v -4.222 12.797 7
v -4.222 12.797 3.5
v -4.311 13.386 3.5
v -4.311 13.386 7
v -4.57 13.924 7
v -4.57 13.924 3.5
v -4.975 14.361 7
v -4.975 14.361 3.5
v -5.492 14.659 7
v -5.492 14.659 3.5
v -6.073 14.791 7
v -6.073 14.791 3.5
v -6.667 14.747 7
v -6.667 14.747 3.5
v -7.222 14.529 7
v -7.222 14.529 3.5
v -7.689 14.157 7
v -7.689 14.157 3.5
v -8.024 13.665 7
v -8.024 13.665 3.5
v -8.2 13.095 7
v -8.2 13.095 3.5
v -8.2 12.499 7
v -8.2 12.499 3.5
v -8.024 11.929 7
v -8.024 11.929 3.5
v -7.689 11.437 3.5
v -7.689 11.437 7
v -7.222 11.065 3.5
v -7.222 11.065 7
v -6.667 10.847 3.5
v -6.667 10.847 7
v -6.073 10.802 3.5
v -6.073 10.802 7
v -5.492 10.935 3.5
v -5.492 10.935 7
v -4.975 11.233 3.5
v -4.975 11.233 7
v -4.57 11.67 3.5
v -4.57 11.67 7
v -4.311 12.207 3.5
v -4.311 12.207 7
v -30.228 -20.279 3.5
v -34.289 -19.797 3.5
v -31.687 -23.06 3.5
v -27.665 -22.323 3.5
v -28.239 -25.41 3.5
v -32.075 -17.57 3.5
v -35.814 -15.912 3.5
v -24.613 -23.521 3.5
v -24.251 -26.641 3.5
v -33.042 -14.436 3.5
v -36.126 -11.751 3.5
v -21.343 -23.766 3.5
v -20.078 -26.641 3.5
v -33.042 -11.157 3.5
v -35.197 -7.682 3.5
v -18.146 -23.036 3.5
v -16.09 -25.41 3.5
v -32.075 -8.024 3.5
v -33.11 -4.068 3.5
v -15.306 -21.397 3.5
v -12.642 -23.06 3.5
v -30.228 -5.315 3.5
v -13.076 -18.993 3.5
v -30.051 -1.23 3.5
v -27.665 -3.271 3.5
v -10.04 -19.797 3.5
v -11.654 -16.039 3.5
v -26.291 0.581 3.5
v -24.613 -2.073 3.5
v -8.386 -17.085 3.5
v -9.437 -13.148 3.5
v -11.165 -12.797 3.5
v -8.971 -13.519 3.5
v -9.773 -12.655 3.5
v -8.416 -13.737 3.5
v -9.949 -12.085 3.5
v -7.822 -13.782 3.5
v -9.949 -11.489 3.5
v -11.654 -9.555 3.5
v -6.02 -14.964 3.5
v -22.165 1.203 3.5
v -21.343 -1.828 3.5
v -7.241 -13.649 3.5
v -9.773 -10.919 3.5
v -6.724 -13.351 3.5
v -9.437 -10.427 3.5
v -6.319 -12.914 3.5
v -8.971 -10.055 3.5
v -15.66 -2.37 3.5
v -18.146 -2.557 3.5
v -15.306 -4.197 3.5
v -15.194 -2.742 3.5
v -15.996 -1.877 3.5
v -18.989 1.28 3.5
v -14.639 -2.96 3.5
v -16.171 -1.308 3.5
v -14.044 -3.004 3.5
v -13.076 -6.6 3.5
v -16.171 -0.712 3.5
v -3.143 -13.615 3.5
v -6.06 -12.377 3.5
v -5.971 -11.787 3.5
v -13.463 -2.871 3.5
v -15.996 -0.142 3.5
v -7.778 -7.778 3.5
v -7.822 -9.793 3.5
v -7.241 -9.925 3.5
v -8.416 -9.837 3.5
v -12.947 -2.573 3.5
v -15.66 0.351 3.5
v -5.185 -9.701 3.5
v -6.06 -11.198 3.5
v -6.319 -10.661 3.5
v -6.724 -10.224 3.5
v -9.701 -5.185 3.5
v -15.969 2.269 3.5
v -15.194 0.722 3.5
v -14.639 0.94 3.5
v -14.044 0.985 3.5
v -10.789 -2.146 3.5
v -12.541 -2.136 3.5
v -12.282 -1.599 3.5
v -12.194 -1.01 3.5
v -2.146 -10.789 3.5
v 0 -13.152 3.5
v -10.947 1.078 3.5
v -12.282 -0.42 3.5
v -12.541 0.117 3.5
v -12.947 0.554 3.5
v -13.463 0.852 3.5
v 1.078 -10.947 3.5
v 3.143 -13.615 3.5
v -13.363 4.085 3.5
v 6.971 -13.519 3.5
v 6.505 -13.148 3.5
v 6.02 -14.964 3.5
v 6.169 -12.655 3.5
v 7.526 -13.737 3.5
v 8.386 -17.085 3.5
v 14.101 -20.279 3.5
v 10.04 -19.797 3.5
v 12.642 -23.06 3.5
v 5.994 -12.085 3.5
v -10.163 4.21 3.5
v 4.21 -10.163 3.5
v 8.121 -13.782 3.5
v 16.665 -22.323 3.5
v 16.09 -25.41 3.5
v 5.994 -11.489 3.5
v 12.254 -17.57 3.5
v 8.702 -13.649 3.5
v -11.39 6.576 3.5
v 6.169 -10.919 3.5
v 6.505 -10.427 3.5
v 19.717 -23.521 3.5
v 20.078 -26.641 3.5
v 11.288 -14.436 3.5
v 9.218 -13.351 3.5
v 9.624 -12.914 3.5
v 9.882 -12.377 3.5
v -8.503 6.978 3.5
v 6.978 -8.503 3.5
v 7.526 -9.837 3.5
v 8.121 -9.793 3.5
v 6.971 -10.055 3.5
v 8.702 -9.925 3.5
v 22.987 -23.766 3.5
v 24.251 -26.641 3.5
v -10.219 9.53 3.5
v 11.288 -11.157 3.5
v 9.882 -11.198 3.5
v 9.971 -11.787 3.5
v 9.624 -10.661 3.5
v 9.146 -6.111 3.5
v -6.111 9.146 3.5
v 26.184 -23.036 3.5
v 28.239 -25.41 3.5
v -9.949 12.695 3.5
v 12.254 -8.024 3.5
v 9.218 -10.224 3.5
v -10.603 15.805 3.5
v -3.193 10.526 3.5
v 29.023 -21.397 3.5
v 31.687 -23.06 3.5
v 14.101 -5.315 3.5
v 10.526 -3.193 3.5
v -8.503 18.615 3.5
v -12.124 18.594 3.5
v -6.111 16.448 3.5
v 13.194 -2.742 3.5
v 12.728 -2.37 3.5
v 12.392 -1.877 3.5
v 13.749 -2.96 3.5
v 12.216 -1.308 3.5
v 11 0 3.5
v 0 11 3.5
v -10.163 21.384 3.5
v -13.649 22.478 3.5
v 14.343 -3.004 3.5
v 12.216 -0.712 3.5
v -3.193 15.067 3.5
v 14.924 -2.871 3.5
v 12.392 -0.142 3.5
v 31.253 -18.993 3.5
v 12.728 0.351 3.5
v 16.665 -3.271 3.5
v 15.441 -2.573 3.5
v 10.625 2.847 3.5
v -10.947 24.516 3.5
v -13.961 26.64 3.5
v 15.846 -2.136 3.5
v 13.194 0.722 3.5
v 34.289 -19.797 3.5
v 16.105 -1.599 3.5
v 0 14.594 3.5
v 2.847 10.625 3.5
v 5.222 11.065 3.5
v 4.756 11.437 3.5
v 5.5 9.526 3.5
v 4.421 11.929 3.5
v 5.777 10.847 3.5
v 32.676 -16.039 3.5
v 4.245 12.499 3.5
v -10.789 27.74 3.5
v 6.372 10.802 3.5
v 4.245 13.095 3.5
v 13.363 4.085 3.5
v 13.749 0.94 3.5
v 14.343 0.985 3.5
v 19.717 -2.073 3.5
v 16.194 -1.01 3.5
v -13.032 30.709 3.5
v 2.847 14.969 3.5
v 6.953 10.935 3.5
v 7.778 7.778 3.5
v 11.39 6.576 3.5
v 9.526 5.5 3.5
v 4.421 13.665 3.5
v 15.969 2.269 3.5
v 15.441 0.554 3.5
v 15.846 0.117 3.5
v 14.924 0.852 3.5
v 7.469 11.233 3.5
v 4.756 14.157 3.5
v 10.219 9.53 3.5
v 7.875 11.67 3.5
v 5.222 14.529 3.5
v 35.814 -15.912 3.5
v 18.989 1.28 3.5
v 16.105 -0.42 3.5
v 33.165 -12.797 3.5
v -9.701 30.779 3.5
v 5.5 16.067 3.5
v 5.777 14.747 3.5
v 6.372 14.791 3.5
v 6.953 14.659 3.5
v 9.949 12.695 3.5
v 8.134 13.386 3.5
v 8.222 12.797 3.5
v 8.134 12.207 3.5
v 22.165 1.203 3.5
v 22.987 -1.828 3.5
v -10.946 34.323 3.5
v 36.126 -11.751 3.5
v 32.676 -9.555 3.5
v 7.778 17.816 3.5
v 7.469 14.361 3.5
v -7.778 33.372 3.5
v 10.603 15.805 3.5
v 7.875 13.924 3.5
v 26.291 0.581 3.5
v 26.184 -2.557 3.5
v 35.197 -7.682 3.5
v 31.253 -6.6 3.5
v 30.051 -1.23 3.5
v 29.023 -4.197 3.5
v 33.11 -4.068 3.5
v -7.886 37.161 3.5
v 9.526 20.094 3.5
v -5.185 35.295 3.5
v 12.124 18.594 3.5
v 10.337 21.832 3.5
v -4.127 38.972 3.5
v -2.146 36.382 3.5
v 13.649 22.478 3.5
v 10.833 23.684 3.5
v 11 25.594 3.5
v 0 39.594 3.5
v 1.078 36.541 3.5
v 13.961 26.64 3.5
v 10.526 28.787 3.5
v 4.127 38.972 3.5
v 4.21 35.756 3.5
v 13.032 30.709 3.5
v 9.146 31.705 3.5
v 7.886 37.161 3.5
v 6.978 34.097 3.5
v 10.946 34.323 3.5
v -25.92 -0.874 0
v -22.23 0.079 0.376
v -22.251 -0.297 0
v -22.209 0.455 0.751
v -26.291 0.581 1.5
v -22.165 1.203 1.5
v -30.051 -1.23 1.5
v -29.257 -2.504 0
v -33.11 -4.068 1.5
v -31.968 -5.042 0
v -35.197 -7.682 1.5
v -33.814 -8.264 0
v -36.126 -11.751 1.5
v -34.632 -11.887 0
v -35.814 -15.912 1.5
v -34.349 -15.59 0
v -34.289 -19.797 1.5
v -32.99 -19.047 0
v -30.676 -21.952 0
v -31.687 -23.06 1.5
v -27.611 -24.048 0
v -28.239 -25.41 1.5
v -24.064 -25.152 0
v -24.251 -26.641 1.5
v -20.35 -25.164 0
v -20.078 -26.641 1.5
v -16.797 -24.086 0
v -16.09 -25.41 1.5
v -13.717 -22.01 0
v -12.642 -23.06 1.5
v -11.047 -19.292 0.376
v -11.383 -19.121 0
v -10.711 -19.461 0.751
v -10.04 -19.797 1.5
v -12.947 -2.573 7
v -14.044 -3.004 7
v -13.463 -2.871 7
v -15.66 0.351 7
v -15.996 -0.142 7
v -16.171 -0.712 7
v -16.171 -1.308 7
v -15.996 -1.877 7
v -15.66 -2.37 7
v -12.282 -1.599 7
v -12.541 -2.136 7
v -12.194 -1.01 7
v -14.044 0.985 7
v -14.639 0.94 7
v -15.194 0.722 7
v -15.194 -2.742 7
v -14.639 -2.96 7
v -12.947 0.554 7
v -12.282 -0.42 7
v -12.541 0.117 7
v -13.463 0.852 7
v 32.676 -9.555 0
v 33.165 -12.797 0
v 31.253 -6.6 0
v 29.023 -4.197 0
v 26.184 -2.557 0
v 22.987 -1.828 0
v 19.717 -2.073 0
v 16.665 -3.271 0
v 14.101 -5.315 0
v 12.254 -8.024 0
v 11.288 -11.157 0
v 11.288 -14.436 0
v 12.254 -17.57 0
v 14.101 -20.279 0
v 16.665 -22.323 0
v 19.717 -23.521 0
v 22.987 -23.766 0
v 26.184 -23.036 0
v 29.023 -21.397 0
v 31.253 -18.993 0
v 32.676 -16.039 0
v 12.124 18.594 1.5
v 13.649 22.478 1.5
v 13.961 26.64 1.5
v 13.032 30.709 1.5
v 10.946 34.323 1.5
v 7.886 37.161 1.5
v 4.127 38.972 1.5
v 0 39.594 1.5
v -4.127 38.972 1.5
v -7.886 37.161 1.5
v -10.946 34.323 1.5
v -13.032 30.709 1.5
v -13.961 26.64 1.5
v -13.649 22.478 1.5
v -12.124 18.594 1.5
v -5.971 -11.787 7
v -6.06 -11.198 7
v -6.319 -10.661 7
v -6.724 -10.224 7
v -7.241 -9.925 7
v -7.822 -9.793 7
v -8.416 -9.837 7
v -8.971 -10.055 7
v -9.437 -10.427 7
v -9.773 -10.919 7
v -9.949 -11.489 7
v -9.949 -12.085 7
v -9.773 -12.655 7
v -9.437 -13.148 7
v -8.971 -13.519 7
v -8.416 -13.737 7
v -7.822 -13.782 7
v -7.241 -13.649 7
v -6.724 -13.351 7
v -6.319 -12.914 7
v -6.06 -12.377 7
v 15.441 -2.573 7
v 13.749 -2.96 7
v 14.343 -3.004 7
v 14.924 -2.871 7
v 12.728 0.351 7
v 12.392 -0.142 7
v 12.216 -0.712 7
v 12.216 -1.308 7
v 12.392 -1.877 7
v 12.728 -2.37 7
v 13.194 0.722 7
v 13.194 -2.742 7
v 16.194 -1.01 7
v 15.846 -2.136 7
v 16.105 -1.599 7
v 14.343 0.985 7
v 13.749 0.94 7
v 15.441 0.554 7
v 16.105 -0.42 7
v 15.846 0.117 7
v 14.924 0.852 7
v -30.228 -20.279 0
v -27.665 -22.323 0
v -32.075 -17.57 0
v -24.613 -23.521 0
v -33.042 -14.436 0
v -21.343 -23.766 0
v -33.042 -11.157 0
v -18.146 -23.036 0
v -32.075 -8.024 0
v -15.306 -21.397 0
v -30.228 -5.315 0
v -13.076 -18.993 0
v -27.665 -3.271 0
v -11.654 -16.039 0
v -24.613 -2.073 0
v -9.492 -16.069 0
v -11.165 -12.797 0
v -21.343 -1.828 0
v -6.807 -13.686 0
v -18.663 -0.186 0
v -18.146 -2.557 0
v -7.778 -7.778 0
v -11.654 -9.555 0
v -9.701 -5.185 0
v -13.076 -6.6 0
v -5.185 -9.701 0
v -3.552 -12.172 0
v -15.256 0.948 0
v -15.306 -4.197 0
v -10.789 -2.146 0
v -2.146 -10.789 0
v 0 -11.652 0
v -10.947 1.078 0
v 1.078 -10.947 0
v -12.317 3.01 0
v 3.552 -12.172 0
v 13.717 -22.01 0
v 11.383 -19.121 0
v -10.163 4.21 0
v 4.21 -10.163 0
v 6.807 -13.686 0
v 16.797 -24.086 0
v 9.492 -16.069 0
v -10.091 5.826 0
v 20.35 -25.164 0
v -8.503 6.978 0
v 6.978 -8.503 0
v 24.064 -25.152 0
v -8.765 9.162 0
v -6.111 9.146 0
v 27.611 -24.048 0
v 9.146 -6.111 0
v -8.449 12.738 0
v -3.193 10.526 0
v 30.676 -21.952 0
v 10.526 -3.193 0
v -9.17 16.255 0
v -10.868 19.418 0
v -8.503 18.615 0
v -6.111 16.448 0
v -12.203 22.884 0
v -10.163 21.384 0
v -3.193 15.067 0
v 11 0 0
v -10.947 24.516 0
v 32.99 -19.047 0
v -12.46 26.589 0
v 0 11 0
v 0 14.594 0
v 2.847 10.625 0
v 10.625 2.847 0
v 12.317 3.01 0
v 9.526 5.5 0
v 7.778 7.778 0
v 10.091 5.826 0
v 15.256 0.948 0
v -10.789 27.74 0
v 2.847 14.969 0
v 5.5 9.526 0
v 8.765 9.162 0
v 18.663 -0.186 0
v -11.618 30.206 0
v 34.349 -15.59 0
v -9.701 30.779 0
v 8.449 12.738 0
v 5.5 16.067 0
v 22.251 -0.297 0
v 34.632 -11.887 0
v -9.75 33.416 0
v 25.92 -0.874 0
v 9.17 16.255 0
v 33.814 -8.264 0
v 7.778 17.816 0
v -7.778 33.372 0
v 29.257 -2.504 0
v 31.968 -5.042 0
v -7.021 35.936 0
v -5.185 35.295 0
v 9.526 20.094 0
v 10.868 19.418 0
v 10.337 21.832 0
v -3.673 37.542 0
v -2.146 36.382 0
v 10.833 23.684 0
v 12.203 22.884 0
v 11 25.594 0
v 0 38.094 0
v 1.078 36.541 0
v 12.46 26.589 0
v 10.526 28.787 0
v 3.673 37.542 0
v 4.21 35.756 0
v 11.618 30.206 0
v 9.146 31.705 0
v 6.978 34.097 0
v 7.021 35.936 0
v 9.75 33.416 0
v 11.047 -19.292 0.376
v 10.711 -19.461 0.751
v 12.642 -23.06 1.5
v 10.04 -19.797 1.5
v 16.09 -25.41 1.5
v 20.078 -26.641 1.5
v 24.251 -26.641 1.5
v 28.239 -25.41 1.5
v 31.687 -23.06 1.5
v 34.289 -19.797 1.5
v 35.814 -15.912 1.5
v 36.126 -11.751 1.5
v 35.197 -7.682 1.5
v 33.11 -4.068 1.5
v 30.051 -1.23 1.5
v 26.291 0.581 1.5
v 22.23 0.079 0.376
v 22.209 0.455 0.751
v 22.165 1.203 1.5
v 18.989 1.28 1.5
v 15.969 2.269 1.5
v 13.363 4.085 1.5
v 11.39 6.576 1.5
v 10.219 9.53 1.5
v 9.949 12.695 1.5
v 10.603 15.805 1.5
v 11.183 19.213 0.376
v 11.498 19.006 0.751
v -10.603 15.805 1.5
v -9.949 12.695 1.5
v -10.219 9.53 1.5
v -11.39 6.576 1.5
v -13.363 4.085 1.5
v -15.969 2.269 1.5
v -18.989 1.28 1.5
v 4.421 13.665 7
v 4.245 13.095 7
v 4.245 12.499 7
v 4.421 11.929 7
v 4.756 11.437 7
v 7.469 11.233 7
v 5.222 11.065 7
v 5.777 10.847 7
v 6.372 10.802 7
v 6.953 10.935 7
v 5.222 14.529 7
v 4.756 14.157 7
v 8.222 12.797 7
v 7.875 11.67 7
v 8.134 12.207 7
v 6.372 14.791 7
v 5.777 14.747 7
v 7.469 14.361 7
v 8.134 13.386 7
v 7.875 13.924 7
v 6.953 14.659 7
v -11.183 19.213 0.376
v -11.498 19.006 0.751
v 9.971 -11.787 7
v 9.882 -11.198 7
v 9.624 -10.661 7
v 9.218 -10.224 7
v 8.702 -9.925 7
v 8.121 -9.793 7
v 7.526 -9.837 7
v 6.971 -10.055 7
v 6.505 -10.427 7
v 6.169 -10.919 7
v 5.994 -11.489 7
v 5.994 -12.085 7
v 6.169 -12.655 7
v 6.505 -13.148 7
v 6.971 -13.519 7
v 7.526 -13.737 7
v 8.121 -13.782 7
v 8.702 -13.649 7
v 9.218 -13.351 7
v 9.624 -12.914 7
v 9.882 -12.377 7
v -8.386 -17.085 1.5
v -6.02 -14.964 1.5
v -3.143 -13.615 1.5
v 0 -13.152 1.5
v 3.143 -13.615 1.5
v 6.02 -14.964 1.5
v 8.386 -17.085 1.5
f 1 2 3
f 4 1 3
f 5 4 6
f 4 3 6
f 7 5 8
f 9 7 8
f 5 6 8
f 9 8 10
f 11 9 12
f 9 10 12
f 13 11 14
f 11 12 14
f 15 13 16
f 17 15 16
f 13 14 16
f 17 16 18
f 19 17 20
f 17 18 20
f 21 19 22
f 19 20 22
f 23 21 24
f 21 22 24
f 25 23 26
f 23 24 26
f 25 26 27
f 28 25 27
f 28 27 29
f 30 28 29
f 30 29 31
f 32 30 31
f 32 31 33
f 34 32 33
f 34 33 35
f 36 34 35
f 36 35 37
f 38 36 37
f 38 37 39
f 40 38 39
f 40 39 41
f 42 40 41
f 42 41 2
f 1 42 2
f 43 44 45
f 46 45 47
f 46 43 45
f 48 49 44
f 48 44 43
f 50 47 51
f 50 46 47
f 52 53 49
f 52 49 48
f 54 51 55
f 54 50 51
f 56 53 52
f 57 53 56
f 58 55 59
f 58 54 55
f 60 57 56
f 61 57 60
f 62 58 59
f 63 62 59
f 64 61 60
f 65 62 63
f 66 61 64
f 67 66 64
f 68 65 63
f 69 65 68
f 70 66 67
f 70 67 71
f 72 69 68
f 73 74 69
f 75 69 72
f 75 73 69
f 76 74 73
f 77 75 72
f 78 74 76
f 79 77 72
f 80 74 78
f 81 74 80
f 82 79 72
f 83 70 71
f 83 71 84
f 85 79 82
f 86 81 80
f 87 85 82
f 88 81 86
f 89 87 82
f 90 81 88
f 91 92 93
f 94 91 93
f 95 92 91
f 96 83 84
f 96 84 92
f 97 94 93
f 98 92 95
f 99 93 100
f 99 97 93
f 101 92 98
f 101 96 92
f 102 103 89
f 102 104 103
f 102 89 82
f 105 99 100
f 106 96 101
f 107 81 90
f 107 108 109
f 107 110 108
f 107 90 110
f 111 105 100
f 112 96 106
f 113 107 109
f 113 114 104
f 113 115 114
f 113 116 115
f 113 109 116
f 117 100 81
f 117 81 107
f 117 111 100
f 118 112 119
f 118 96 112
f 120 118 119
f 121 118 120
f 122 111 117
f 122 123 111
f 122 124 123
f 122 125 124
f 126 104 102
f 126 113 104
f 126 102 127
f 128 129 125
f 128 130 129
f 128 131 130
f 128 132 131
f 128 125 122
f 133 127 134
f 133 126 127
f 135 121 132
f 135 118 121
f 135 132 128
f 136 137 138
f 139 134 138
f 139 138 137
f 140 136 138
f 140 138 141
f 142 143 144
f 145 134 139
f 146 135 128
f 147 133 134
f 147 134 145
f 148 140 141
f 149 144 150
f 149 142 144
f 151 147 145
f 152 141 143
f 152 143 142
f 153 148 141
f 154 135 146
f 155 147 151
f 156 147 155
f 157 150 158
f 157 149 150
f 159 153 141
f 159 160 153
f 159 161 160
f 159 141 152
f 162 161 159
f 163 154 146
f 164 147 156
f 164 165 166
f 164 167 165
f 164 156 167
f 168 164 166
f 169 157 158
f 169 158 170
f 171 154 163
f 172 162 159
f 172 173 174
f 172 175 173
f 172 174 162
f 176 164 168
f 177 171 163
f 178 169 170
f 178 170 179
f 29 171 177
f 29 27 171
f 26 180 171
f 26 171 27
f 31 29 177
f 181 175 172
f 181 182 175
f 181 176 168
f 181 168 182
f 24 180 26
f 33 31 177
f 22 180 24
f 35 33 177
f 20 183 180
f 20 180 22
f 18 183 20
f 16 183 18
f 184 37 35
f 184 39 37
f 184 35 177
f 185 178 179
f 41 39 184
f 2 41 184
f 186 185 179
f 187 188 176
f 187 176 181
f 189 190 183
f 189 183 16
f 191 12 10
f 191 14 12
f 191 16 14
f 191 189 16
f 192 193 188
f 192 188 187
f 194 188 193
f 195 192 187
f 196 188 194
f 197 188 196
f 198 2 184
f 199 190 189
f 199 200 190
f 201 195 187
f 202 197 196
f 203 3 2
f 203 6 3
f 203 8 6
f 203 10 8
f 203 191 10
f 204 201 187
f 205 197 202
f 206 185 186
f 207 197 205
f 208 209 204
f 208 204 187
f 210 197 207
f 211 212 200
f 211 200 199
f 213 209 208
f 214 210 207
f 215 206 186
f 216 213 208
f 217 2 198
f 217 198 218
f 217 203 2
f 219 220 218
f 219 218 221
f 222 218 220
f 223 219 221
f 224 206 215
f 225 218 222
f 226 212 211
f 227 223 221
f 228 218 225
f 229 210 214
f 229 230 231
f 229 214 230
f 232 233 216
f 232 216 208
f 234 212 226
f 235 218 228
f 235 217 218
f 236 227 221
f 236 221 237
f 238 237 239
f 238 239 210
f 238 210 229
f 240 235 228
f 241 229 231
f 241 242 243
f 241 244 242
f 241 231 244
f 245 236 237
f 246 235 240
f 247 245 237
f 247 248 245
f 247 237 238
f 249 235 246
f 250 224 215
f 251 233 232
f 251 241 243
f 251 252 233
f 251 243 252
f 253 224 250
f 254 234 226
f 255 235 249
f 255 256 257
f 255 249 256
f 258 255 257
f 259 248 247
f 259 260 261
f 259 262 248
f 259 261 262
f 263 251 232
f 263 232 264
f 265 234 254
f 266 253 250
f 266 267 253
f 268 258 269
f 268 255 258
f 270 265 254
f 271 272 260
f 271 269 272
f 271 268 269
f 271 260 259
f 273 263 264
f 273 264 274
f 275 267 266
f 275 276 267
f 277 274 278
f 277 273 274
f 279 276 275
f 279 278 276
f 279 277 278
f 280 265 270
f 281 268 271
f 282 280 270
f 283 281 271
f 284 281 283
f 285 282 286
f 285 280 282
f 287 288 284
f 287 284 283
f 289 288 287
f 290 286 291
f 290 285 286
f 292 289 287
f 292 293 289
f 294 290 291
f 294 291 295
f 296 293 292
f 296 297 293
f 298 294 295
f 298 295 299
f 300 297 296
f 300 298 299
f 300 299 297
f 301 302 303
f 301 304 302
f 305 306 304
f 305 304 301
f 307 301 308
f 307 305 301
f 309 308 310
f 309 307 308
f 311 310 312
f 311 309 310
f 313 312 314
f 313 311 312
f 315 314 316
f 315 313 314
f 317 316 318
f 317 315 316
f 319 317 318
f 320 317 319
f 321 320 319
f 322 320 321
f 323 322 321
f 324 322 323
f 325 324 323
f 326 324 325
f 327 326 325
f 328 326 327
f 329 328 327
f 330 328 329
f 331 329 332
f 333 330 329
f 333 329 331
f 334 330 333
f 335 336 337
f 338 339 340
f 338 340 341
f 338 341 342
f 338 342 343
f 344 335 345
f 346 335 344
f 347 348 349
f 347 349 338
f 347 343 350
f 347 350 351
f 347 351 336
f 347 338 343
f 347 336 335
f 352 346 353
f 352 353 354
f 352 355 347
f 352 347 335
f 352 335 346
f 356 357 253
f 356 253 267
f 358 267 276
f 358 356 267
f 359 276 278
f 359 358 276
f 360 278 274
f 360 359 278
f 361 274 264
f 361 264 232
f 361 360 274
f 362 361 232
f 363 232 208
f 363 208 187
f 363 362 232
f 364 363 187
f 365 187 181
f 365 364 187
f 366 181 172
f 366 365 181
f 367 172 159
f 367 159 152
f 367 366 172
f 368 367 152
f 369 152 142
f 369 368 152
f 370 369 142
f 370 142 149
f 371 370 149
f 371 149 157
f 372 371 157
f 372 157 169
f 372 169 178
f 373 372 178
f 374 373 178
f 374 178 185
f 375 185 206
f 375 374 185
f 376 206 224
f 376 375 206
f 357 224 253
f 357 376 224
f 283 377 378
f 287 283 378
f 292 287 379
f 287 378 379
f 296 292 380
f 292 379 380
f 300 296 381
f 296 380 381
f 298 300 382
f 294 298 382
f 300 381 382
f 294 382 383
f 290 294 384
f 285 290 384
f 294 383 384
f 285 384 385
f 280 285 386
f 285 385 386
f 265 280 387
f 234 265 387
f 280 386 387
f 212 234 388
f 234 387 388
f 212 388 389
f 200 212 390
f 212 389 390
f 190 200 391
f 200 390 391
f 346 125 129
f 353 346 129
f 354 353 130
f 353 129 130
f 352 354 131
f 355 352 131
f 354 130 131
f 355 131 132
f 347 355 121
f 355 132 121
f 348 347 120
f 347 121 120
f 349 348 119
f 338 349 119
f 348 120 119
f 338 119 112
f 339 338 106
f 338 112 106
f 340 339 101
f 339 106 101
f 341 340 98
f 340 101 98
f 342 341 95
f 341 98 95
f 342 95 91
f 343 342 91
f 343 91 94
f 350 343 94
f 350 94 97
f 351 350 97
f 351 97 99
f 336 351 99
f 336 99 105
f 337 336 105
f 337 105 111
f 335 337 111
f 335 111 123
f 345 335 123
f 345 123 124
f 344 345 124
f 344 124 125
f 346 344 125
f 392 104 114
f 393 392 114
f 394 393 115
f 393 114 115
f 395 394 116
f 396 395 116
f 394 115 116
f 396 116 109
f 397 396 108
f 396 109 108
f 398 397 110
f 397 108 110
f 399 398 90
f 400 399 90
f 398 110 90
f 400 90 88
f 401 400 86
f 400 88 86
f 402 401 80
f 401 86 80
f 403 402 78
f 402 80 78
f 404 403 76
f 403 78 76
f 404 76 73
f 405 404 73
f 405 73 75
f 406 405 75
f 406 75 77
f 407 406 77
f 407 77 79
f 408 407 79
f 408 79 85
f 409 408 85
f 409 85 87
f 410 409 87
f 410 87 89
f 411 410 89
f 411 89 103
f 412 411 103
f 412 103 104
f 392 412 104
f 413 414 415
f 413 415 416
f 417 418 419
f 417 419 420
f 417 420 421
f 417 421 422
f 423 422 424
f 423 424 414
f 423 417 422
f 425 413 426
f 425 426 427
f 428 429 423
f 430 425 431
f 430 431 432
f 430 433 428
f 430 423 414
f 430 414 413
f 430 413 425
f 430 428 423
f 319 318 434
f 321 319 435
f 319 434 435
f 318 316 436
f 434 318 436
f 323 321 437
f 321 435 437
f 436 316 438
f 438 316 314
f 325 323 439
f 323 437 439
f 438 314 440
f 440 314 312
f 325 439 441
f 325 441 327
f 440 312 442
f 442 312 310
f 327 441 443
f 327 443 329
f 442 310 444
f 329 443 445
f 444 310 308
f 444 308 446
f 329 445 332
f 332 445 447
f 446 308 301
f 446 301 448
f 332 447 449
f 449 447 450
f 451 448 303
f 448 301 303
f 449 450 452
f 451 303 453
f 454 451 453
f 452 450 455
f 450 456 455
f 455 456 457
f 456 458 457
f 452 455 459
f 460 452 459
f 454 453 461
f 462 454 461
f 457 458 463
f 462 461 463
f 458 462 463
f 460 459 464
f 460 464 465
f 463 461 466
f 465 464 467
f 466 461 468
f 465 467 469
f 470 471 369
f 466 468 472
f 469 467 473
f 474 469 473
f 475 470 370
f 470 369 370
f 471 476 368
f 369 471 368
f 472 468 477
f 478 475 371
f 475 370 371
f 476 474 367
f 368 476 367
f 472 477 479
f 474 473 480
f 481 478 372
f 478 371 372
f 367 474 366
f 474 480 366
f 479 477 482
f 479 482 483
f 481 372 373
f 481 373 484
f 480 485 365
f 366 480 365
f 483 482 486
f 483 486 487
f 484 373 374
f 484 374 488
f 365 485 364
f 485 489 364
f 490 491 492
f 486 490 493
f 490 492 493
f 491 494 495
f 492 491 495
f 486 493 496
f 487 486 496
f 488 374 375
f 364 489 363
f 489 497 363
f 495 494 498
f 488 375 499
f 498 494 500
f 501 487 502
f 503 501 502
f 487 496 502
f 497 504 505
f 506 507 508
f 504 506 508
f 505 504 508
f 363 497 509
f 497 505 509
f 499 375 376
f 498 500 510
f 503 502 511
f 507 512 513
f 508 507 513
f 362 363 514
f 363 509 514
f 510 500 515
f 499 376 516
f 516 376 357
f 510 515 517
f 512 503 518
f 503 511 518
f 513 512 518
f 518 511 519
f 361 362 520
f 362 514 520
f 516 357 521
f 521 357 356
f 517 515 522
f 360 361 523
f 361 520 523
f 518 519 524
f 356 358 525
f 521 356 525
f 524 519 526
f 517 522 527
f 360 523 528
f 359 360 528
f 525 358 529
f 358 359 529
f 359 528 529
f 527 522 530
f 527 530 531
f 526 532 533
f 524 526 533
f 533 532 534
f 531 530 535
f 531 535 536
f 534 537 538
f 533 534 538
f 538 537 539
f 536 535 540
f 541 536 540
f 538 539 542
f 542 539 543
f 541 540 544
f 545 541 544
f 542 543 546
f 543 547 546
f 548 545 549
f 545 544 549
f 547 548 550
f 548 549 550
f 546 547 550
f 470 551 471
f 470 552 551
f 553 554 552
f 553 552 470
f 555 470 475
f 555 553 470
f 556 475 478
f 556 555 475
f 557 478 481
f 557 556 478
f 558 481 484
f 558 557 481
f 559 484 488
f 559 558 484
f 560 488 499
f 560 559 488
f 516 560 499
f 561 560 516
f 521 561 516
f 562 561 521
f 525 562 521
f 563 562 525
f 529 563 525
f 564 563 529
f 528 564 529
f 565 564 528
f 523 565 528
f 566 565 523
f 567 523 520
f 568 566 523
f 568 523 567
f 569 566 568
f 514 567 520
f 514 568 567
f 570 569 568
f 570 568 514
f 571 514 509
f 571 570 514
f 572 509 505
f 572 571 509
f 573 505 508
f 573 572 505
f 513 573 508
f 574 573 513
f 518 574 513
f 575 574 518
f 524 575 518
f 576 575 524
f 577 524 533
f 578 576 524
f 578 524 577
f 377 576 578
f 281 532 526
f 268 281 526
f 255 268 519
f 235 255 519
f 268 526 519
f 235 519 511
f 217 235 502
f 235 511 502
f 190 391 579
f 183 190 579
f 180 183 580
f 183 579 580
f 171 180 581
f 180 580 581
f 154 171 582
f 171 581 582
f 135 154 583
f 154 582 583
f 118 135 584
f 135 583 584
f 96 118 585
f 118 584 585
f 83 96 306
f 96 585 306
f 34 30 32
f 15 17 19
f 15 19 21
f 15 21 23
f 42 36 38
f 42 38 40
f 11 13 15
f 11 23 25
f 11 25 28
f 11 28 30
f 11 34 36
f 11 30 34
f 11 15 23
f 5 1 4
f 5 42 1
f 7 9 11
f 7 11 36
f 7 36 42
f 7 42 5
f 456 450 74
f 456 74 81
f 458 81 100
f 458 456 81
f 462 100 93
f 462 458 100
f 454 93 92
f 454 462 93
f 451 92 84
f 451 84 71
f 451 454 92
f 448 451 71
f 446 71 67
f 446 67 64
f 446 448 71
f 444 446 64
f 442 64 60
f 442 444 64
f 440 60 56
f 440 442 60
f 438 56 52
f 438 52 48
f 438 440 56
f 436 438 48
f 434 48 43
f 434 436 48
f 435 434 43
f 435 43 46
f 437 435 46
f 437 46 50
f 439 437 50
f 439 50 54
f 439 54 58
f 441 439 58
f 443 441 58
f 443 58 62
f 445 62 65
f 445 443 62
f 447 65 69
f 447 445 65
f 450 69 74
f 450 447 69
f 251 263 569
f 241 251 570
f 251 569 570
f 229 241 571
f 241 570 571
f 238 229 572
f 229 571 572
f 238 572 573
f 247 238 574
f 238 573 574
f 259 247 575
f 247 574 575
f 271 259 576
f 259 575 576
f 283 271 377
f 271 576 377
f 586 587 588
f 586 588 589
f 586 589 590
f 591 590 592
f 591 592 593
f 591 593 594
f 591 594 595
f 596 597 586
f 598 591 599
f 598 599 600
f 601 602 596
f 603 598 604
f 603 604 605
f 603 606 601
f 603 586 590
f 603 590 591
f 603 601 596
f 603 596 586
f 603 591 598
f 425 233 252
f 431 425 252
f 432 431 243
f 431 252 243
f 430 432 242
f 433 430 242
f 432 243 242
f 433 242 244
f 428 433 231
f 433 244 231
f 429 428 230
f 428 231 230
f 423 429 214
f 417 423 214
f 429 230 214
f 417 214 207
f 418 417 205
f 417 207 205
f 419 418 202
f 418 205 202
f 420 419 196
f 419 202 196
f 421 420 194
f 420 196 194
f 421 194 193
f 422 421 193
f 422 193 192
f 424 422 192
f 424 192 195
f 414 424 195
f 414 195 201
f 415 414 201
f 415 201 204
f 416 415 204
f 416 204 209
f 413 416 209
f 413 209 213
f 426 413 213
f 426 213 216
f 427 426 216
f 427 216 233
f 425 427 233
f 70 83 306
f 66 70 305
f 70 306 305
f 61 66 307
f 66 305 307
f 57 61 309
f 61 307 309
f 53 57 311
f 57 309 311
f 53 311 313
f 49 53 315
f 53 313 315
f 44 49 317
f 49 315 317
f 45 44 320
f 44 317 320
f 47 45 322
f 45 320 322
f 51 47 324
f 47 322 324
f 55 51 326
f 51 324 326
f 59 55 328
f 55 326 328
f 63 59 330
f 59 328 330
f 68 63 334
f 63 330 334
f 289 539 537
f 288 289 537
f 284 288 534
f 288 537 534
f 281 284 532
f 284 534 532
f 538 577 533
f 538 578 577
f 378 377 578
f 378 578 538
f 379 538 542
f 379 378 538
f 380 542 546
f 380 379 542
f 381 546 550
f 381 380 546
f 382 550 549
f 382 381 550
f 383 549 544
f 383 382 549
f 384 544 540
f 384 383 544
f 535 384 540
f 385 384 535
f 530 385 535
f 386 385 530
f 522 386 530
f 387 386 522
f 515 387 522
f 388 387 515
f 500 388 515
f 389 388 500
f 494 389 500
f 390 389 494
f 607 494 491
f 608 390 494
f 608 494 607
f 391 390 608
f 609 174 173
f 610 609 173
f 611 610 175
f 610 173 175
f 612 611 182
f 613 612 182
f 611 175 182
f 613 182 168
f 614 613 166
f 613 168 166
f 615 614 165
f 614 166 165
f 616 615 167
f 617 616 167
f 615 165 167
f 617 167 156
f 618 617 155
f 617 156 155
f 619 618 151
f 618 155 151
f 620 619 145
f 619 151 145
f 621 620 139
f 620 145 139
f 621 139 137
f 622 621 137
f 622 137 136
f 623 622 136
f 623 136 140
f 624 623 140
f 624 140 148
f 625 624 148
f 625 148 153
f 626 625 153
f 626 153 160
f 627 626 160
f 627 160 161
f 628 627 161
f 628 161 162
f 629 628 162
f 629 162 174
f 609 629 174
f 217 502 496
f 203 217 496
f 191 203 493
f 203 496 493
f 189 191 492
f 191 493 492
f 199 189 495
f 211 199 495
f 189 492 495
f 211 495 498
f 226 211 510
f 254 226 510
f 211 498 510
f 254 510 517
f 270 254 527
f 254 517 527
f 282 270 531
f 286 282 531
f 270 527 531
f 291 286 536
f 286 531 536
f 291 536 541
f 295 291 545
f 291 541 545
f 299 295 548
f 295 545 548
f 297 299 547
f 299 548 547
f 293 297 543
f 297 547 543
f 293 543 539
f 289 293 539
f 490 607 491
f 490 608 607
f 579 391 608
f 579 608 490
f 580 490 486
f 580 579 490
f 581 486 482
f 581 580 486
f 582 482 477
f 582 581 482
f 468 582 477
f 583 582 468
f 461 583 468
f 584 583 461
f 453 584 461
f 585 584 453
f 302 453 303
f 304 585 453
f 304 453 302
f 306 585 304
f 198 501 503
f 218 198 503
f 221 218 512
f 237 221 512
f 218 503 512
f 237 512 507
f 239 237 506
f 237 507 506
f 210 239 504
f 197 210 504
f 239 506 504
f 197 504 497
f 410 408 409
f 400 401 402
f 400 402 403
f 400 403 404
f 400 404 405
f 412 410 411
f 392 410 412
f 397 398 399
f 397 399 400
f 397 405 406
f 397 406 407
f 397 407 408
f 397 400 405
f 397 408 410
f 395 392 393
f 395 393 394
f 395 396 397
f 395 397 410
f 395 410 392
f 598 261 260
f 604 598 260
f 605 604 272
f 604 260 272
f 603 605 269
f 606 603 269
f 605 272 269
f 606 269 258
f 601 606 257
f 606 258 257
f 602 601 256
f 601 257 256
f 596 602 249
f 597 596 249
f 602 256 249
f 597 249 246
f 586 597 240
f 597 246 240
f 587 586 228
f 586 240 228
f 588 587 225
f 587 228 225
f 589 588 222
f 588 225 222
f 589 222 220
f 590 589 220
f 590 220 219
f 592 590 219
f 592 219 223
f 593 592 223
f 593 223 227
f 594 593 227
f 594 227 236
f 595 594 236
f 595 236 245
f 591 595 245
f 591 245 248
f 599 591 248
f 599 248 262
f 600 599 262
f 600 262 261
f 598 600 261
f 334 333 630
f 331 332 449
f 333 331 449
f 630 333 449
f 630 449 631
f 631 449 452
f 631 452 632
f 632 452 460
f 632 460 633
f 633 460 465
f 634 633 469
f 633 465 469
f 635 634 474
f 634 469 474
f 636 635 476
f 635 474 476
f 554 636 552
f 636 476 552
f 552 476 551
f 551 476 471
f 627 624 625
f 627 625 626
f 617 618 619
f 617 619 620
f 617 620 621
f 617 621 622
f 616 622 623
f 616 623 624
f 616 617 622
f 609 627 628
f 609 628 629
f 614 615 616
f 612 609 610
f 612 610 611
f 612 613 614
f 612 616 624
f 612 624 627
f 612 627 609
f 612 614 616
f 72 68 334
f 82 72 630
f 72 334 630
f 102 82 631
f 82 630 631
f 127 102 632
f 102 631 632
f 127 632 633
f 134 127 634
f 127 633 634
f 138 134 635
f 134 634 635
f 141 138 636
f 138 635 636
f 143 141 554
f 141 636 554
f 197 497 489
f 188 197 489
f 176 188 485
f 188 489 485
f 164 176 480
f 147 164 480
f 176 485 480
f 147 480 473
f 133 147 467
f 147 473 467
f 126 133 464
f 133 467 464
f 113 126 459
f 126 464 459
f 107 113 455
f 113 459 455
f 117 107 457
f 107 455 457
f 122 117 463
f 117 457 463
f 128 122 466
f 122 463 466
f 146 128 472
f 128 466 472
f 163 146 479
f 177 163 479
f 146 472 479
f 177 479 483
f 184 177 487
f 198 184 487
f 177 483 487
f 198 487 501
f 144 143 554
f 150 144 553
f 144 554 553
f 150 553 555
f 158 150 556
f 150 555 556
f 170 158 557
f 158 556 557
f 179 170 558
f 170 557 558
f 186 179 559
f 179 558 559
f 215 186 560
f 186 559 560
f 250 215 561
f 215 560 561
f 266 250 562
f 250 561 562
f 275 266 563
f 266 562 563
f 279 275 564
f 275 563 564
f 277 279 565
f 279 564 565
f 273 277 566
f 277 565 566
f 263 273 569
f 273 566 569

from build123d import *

# Parameters (mm, degrees)
F0_R       = 11
F0_R_2     = 2
F1_DEPTH   = 3.5
F2_DEPTH   = 7
F3_C1_SIZE = 1.5
F3_C2_SIZE = 1.5
F3_C3_SIZE = 1.5
F3_C4_SIZE = 1.5
F3_C5_SIZE = 1.5
F3_C6_SIZE = 1.5


with BuildPart() as f1:
    # F0 (on Top) → F1 (new body)
    with BuildSketch(Plane.XY):
        with BuildLine():
            ThreePointArc((22.164837833, 1.2031249106), (11.390396953, 6.576248747), (12.124355653, 18.5937501788))
            ThreePointArc((12.124355653, 18.5937501788), (0, 39.5937501788), (-12.124355653, 18.5937501788))
            ThreePointArc((-12.124355653, 18.5937501788), (-11.390396953, 6.576248747), (-22.164837833, 1.2031249106))
            ThreePointArc((-22.164837833, 1.2031249106), (-34.2891934859, -19.7968750894), (-10.04048218, -19.7968750894))
            ThreePointArc((-10.04048218, -19.7968750894), (0, -13.152497494), (10.04048218, -19.7968750894))
            ThreePointArc((10.04048218, -19.7968750894), (34.2891934859, -19.7968750894), (22.164837833, 1.2031249106))
        make_face()
        with Locations((-22.164837833, -12.7968750894)):
            Circle(F0_R, mode=Mode.SUBTRACT)
        with Locations((-7.9711980778, -11.7872301109)):
            Circle(F0_R_2, mode=Mode.SUBTRACT)
        with Locations((-14.1936397552, -1.0096449785)):
            Circle(F0_R_2, mode=Mode.SUBTRACT)
        with Locations((7.9711980778, -11.7872301109)):
            Circle(F0_R_2, mode=Mode.SUBTRACT)
        with Locations((22.164837833, -12.7968750894)):
            Circle(F0_R, mode=Mode.SUBTRACT)
        with BuildLine():
            ThreePointArc((0, 11), (7.7781745931, 7.7781745931), (11, 0))
            ThreePointArc((11, 0), (-7.7781745931, -7.7781745931), (0, 11))
        make_face(mode=Mode.SUBTRACT)
        with Locations((14.1936397552, -1.0096449785)):
            Circle(F0_R_2, mode=Mode.SUBTRACT)
        with Locations((-6.2224416774, 12.7968750894)):
            Circle(F0_R_2, mode=Mode.SUBTRACT)
        with Locations((6.2224416774, 12.7968750894)):
            Circle(F0_R_2, mode=Mode.SUBTRACT)
        with BuildLine():
            ThreePointArc((9.5262794416, 20.0937501788), (5.5, 16.0674707372), (0, 14.5937501788))
            ThreePointArc((0, 14.5937501788), (-5.5, 16.0674707372), (-9.5262794416, 20.0937501788))
            ThreePointArc((-9.5262794416, 20.0937501788), (-2.8470094961, 36.218934268), (11, 25.5937501788))
            ThreePointArc((11, 25.5937501788), (10.6251840892, 22.7467406827), (9.5262794416, 20.0937501788))
        make_face(mode=Mode.SUBTRACT)
    extrude(amount=F1_DEPTH)

    # F0 (on Top) → F2 (join)
    with BuildSketch(Plane.XY):
        with Locations((-6.2224416774, 12.7968750894)):
            Circle(F0_R_2)
        with Locations((6.2224416774, 12.7968750894)):
            Circle(F0_R_2)
        with Locations((14.1936397552, -1.0096449785)):
            Circle(F0_R_2)
        with Locations((7.9711980778, -11.7872301109)):
            Circle(F0_R_2)
        with Locations((-7.9711980778, -11.7872301109)):
            Circle(F0_R_2)
        with Locations((-14.1936397552, -1.0096449785)):
            Circle(F0_R_2)
    extrude(amount=F2_DEPTH)

    # F3: chamfer of 1.5 on 6 edges, made by hand

    # F3_c1
    f3_c1_edges = [f1.edges().sort_by_distance(p)[0] for p in [
        (0, -13.152497494, 0),
    ]]
    chamfer(f3_c1_edges, length=F3_C1_SIZE)

    # F3_c2
    f3_c2_edges = [f1.edges().sort_by_distance(p)[0] for p in [
        (11.390396953, 6.576248747, 0),
    ]]
    chamfer(f3_c2_edges, length=F3_C2_SIZE)

    # F3_c3
    f3_c3_edges = [f1.edges().sort_by_distance(p)[0] for p in [
        (-11.390396953, 6.576248747, 0),
    ]]
    chamfer(f3_c3_edges, length=F3_C3_SIZE)

    # F3_c4
    f3_c4_edges = [f1.edges().sort_by_distance(p)[0] for p in [
        (-34.2891934859, -19.7968750894, 0),
    ]]
    chamfer(f3_c4_edges, length=F3_C4_SIZE)

    # F3_c5
    f3_c5_edges = [f1.edges().sort_by_distance(p)[0] for p in [
        (34.2891934859, -19.7968750894, 0),
    ]]
    chamfer(f3_c5_edges, length=F3_C5_SIZE)

    # F3_c6
    f3_c6_edges = [f1.edges().sort_by_distance(p)[0] for p in [
        (0, 39.5937501788, 0),
    ]]
    chamfer(f3_c6_edges, length=F3_C6_SIZE)


solid = f1.part
